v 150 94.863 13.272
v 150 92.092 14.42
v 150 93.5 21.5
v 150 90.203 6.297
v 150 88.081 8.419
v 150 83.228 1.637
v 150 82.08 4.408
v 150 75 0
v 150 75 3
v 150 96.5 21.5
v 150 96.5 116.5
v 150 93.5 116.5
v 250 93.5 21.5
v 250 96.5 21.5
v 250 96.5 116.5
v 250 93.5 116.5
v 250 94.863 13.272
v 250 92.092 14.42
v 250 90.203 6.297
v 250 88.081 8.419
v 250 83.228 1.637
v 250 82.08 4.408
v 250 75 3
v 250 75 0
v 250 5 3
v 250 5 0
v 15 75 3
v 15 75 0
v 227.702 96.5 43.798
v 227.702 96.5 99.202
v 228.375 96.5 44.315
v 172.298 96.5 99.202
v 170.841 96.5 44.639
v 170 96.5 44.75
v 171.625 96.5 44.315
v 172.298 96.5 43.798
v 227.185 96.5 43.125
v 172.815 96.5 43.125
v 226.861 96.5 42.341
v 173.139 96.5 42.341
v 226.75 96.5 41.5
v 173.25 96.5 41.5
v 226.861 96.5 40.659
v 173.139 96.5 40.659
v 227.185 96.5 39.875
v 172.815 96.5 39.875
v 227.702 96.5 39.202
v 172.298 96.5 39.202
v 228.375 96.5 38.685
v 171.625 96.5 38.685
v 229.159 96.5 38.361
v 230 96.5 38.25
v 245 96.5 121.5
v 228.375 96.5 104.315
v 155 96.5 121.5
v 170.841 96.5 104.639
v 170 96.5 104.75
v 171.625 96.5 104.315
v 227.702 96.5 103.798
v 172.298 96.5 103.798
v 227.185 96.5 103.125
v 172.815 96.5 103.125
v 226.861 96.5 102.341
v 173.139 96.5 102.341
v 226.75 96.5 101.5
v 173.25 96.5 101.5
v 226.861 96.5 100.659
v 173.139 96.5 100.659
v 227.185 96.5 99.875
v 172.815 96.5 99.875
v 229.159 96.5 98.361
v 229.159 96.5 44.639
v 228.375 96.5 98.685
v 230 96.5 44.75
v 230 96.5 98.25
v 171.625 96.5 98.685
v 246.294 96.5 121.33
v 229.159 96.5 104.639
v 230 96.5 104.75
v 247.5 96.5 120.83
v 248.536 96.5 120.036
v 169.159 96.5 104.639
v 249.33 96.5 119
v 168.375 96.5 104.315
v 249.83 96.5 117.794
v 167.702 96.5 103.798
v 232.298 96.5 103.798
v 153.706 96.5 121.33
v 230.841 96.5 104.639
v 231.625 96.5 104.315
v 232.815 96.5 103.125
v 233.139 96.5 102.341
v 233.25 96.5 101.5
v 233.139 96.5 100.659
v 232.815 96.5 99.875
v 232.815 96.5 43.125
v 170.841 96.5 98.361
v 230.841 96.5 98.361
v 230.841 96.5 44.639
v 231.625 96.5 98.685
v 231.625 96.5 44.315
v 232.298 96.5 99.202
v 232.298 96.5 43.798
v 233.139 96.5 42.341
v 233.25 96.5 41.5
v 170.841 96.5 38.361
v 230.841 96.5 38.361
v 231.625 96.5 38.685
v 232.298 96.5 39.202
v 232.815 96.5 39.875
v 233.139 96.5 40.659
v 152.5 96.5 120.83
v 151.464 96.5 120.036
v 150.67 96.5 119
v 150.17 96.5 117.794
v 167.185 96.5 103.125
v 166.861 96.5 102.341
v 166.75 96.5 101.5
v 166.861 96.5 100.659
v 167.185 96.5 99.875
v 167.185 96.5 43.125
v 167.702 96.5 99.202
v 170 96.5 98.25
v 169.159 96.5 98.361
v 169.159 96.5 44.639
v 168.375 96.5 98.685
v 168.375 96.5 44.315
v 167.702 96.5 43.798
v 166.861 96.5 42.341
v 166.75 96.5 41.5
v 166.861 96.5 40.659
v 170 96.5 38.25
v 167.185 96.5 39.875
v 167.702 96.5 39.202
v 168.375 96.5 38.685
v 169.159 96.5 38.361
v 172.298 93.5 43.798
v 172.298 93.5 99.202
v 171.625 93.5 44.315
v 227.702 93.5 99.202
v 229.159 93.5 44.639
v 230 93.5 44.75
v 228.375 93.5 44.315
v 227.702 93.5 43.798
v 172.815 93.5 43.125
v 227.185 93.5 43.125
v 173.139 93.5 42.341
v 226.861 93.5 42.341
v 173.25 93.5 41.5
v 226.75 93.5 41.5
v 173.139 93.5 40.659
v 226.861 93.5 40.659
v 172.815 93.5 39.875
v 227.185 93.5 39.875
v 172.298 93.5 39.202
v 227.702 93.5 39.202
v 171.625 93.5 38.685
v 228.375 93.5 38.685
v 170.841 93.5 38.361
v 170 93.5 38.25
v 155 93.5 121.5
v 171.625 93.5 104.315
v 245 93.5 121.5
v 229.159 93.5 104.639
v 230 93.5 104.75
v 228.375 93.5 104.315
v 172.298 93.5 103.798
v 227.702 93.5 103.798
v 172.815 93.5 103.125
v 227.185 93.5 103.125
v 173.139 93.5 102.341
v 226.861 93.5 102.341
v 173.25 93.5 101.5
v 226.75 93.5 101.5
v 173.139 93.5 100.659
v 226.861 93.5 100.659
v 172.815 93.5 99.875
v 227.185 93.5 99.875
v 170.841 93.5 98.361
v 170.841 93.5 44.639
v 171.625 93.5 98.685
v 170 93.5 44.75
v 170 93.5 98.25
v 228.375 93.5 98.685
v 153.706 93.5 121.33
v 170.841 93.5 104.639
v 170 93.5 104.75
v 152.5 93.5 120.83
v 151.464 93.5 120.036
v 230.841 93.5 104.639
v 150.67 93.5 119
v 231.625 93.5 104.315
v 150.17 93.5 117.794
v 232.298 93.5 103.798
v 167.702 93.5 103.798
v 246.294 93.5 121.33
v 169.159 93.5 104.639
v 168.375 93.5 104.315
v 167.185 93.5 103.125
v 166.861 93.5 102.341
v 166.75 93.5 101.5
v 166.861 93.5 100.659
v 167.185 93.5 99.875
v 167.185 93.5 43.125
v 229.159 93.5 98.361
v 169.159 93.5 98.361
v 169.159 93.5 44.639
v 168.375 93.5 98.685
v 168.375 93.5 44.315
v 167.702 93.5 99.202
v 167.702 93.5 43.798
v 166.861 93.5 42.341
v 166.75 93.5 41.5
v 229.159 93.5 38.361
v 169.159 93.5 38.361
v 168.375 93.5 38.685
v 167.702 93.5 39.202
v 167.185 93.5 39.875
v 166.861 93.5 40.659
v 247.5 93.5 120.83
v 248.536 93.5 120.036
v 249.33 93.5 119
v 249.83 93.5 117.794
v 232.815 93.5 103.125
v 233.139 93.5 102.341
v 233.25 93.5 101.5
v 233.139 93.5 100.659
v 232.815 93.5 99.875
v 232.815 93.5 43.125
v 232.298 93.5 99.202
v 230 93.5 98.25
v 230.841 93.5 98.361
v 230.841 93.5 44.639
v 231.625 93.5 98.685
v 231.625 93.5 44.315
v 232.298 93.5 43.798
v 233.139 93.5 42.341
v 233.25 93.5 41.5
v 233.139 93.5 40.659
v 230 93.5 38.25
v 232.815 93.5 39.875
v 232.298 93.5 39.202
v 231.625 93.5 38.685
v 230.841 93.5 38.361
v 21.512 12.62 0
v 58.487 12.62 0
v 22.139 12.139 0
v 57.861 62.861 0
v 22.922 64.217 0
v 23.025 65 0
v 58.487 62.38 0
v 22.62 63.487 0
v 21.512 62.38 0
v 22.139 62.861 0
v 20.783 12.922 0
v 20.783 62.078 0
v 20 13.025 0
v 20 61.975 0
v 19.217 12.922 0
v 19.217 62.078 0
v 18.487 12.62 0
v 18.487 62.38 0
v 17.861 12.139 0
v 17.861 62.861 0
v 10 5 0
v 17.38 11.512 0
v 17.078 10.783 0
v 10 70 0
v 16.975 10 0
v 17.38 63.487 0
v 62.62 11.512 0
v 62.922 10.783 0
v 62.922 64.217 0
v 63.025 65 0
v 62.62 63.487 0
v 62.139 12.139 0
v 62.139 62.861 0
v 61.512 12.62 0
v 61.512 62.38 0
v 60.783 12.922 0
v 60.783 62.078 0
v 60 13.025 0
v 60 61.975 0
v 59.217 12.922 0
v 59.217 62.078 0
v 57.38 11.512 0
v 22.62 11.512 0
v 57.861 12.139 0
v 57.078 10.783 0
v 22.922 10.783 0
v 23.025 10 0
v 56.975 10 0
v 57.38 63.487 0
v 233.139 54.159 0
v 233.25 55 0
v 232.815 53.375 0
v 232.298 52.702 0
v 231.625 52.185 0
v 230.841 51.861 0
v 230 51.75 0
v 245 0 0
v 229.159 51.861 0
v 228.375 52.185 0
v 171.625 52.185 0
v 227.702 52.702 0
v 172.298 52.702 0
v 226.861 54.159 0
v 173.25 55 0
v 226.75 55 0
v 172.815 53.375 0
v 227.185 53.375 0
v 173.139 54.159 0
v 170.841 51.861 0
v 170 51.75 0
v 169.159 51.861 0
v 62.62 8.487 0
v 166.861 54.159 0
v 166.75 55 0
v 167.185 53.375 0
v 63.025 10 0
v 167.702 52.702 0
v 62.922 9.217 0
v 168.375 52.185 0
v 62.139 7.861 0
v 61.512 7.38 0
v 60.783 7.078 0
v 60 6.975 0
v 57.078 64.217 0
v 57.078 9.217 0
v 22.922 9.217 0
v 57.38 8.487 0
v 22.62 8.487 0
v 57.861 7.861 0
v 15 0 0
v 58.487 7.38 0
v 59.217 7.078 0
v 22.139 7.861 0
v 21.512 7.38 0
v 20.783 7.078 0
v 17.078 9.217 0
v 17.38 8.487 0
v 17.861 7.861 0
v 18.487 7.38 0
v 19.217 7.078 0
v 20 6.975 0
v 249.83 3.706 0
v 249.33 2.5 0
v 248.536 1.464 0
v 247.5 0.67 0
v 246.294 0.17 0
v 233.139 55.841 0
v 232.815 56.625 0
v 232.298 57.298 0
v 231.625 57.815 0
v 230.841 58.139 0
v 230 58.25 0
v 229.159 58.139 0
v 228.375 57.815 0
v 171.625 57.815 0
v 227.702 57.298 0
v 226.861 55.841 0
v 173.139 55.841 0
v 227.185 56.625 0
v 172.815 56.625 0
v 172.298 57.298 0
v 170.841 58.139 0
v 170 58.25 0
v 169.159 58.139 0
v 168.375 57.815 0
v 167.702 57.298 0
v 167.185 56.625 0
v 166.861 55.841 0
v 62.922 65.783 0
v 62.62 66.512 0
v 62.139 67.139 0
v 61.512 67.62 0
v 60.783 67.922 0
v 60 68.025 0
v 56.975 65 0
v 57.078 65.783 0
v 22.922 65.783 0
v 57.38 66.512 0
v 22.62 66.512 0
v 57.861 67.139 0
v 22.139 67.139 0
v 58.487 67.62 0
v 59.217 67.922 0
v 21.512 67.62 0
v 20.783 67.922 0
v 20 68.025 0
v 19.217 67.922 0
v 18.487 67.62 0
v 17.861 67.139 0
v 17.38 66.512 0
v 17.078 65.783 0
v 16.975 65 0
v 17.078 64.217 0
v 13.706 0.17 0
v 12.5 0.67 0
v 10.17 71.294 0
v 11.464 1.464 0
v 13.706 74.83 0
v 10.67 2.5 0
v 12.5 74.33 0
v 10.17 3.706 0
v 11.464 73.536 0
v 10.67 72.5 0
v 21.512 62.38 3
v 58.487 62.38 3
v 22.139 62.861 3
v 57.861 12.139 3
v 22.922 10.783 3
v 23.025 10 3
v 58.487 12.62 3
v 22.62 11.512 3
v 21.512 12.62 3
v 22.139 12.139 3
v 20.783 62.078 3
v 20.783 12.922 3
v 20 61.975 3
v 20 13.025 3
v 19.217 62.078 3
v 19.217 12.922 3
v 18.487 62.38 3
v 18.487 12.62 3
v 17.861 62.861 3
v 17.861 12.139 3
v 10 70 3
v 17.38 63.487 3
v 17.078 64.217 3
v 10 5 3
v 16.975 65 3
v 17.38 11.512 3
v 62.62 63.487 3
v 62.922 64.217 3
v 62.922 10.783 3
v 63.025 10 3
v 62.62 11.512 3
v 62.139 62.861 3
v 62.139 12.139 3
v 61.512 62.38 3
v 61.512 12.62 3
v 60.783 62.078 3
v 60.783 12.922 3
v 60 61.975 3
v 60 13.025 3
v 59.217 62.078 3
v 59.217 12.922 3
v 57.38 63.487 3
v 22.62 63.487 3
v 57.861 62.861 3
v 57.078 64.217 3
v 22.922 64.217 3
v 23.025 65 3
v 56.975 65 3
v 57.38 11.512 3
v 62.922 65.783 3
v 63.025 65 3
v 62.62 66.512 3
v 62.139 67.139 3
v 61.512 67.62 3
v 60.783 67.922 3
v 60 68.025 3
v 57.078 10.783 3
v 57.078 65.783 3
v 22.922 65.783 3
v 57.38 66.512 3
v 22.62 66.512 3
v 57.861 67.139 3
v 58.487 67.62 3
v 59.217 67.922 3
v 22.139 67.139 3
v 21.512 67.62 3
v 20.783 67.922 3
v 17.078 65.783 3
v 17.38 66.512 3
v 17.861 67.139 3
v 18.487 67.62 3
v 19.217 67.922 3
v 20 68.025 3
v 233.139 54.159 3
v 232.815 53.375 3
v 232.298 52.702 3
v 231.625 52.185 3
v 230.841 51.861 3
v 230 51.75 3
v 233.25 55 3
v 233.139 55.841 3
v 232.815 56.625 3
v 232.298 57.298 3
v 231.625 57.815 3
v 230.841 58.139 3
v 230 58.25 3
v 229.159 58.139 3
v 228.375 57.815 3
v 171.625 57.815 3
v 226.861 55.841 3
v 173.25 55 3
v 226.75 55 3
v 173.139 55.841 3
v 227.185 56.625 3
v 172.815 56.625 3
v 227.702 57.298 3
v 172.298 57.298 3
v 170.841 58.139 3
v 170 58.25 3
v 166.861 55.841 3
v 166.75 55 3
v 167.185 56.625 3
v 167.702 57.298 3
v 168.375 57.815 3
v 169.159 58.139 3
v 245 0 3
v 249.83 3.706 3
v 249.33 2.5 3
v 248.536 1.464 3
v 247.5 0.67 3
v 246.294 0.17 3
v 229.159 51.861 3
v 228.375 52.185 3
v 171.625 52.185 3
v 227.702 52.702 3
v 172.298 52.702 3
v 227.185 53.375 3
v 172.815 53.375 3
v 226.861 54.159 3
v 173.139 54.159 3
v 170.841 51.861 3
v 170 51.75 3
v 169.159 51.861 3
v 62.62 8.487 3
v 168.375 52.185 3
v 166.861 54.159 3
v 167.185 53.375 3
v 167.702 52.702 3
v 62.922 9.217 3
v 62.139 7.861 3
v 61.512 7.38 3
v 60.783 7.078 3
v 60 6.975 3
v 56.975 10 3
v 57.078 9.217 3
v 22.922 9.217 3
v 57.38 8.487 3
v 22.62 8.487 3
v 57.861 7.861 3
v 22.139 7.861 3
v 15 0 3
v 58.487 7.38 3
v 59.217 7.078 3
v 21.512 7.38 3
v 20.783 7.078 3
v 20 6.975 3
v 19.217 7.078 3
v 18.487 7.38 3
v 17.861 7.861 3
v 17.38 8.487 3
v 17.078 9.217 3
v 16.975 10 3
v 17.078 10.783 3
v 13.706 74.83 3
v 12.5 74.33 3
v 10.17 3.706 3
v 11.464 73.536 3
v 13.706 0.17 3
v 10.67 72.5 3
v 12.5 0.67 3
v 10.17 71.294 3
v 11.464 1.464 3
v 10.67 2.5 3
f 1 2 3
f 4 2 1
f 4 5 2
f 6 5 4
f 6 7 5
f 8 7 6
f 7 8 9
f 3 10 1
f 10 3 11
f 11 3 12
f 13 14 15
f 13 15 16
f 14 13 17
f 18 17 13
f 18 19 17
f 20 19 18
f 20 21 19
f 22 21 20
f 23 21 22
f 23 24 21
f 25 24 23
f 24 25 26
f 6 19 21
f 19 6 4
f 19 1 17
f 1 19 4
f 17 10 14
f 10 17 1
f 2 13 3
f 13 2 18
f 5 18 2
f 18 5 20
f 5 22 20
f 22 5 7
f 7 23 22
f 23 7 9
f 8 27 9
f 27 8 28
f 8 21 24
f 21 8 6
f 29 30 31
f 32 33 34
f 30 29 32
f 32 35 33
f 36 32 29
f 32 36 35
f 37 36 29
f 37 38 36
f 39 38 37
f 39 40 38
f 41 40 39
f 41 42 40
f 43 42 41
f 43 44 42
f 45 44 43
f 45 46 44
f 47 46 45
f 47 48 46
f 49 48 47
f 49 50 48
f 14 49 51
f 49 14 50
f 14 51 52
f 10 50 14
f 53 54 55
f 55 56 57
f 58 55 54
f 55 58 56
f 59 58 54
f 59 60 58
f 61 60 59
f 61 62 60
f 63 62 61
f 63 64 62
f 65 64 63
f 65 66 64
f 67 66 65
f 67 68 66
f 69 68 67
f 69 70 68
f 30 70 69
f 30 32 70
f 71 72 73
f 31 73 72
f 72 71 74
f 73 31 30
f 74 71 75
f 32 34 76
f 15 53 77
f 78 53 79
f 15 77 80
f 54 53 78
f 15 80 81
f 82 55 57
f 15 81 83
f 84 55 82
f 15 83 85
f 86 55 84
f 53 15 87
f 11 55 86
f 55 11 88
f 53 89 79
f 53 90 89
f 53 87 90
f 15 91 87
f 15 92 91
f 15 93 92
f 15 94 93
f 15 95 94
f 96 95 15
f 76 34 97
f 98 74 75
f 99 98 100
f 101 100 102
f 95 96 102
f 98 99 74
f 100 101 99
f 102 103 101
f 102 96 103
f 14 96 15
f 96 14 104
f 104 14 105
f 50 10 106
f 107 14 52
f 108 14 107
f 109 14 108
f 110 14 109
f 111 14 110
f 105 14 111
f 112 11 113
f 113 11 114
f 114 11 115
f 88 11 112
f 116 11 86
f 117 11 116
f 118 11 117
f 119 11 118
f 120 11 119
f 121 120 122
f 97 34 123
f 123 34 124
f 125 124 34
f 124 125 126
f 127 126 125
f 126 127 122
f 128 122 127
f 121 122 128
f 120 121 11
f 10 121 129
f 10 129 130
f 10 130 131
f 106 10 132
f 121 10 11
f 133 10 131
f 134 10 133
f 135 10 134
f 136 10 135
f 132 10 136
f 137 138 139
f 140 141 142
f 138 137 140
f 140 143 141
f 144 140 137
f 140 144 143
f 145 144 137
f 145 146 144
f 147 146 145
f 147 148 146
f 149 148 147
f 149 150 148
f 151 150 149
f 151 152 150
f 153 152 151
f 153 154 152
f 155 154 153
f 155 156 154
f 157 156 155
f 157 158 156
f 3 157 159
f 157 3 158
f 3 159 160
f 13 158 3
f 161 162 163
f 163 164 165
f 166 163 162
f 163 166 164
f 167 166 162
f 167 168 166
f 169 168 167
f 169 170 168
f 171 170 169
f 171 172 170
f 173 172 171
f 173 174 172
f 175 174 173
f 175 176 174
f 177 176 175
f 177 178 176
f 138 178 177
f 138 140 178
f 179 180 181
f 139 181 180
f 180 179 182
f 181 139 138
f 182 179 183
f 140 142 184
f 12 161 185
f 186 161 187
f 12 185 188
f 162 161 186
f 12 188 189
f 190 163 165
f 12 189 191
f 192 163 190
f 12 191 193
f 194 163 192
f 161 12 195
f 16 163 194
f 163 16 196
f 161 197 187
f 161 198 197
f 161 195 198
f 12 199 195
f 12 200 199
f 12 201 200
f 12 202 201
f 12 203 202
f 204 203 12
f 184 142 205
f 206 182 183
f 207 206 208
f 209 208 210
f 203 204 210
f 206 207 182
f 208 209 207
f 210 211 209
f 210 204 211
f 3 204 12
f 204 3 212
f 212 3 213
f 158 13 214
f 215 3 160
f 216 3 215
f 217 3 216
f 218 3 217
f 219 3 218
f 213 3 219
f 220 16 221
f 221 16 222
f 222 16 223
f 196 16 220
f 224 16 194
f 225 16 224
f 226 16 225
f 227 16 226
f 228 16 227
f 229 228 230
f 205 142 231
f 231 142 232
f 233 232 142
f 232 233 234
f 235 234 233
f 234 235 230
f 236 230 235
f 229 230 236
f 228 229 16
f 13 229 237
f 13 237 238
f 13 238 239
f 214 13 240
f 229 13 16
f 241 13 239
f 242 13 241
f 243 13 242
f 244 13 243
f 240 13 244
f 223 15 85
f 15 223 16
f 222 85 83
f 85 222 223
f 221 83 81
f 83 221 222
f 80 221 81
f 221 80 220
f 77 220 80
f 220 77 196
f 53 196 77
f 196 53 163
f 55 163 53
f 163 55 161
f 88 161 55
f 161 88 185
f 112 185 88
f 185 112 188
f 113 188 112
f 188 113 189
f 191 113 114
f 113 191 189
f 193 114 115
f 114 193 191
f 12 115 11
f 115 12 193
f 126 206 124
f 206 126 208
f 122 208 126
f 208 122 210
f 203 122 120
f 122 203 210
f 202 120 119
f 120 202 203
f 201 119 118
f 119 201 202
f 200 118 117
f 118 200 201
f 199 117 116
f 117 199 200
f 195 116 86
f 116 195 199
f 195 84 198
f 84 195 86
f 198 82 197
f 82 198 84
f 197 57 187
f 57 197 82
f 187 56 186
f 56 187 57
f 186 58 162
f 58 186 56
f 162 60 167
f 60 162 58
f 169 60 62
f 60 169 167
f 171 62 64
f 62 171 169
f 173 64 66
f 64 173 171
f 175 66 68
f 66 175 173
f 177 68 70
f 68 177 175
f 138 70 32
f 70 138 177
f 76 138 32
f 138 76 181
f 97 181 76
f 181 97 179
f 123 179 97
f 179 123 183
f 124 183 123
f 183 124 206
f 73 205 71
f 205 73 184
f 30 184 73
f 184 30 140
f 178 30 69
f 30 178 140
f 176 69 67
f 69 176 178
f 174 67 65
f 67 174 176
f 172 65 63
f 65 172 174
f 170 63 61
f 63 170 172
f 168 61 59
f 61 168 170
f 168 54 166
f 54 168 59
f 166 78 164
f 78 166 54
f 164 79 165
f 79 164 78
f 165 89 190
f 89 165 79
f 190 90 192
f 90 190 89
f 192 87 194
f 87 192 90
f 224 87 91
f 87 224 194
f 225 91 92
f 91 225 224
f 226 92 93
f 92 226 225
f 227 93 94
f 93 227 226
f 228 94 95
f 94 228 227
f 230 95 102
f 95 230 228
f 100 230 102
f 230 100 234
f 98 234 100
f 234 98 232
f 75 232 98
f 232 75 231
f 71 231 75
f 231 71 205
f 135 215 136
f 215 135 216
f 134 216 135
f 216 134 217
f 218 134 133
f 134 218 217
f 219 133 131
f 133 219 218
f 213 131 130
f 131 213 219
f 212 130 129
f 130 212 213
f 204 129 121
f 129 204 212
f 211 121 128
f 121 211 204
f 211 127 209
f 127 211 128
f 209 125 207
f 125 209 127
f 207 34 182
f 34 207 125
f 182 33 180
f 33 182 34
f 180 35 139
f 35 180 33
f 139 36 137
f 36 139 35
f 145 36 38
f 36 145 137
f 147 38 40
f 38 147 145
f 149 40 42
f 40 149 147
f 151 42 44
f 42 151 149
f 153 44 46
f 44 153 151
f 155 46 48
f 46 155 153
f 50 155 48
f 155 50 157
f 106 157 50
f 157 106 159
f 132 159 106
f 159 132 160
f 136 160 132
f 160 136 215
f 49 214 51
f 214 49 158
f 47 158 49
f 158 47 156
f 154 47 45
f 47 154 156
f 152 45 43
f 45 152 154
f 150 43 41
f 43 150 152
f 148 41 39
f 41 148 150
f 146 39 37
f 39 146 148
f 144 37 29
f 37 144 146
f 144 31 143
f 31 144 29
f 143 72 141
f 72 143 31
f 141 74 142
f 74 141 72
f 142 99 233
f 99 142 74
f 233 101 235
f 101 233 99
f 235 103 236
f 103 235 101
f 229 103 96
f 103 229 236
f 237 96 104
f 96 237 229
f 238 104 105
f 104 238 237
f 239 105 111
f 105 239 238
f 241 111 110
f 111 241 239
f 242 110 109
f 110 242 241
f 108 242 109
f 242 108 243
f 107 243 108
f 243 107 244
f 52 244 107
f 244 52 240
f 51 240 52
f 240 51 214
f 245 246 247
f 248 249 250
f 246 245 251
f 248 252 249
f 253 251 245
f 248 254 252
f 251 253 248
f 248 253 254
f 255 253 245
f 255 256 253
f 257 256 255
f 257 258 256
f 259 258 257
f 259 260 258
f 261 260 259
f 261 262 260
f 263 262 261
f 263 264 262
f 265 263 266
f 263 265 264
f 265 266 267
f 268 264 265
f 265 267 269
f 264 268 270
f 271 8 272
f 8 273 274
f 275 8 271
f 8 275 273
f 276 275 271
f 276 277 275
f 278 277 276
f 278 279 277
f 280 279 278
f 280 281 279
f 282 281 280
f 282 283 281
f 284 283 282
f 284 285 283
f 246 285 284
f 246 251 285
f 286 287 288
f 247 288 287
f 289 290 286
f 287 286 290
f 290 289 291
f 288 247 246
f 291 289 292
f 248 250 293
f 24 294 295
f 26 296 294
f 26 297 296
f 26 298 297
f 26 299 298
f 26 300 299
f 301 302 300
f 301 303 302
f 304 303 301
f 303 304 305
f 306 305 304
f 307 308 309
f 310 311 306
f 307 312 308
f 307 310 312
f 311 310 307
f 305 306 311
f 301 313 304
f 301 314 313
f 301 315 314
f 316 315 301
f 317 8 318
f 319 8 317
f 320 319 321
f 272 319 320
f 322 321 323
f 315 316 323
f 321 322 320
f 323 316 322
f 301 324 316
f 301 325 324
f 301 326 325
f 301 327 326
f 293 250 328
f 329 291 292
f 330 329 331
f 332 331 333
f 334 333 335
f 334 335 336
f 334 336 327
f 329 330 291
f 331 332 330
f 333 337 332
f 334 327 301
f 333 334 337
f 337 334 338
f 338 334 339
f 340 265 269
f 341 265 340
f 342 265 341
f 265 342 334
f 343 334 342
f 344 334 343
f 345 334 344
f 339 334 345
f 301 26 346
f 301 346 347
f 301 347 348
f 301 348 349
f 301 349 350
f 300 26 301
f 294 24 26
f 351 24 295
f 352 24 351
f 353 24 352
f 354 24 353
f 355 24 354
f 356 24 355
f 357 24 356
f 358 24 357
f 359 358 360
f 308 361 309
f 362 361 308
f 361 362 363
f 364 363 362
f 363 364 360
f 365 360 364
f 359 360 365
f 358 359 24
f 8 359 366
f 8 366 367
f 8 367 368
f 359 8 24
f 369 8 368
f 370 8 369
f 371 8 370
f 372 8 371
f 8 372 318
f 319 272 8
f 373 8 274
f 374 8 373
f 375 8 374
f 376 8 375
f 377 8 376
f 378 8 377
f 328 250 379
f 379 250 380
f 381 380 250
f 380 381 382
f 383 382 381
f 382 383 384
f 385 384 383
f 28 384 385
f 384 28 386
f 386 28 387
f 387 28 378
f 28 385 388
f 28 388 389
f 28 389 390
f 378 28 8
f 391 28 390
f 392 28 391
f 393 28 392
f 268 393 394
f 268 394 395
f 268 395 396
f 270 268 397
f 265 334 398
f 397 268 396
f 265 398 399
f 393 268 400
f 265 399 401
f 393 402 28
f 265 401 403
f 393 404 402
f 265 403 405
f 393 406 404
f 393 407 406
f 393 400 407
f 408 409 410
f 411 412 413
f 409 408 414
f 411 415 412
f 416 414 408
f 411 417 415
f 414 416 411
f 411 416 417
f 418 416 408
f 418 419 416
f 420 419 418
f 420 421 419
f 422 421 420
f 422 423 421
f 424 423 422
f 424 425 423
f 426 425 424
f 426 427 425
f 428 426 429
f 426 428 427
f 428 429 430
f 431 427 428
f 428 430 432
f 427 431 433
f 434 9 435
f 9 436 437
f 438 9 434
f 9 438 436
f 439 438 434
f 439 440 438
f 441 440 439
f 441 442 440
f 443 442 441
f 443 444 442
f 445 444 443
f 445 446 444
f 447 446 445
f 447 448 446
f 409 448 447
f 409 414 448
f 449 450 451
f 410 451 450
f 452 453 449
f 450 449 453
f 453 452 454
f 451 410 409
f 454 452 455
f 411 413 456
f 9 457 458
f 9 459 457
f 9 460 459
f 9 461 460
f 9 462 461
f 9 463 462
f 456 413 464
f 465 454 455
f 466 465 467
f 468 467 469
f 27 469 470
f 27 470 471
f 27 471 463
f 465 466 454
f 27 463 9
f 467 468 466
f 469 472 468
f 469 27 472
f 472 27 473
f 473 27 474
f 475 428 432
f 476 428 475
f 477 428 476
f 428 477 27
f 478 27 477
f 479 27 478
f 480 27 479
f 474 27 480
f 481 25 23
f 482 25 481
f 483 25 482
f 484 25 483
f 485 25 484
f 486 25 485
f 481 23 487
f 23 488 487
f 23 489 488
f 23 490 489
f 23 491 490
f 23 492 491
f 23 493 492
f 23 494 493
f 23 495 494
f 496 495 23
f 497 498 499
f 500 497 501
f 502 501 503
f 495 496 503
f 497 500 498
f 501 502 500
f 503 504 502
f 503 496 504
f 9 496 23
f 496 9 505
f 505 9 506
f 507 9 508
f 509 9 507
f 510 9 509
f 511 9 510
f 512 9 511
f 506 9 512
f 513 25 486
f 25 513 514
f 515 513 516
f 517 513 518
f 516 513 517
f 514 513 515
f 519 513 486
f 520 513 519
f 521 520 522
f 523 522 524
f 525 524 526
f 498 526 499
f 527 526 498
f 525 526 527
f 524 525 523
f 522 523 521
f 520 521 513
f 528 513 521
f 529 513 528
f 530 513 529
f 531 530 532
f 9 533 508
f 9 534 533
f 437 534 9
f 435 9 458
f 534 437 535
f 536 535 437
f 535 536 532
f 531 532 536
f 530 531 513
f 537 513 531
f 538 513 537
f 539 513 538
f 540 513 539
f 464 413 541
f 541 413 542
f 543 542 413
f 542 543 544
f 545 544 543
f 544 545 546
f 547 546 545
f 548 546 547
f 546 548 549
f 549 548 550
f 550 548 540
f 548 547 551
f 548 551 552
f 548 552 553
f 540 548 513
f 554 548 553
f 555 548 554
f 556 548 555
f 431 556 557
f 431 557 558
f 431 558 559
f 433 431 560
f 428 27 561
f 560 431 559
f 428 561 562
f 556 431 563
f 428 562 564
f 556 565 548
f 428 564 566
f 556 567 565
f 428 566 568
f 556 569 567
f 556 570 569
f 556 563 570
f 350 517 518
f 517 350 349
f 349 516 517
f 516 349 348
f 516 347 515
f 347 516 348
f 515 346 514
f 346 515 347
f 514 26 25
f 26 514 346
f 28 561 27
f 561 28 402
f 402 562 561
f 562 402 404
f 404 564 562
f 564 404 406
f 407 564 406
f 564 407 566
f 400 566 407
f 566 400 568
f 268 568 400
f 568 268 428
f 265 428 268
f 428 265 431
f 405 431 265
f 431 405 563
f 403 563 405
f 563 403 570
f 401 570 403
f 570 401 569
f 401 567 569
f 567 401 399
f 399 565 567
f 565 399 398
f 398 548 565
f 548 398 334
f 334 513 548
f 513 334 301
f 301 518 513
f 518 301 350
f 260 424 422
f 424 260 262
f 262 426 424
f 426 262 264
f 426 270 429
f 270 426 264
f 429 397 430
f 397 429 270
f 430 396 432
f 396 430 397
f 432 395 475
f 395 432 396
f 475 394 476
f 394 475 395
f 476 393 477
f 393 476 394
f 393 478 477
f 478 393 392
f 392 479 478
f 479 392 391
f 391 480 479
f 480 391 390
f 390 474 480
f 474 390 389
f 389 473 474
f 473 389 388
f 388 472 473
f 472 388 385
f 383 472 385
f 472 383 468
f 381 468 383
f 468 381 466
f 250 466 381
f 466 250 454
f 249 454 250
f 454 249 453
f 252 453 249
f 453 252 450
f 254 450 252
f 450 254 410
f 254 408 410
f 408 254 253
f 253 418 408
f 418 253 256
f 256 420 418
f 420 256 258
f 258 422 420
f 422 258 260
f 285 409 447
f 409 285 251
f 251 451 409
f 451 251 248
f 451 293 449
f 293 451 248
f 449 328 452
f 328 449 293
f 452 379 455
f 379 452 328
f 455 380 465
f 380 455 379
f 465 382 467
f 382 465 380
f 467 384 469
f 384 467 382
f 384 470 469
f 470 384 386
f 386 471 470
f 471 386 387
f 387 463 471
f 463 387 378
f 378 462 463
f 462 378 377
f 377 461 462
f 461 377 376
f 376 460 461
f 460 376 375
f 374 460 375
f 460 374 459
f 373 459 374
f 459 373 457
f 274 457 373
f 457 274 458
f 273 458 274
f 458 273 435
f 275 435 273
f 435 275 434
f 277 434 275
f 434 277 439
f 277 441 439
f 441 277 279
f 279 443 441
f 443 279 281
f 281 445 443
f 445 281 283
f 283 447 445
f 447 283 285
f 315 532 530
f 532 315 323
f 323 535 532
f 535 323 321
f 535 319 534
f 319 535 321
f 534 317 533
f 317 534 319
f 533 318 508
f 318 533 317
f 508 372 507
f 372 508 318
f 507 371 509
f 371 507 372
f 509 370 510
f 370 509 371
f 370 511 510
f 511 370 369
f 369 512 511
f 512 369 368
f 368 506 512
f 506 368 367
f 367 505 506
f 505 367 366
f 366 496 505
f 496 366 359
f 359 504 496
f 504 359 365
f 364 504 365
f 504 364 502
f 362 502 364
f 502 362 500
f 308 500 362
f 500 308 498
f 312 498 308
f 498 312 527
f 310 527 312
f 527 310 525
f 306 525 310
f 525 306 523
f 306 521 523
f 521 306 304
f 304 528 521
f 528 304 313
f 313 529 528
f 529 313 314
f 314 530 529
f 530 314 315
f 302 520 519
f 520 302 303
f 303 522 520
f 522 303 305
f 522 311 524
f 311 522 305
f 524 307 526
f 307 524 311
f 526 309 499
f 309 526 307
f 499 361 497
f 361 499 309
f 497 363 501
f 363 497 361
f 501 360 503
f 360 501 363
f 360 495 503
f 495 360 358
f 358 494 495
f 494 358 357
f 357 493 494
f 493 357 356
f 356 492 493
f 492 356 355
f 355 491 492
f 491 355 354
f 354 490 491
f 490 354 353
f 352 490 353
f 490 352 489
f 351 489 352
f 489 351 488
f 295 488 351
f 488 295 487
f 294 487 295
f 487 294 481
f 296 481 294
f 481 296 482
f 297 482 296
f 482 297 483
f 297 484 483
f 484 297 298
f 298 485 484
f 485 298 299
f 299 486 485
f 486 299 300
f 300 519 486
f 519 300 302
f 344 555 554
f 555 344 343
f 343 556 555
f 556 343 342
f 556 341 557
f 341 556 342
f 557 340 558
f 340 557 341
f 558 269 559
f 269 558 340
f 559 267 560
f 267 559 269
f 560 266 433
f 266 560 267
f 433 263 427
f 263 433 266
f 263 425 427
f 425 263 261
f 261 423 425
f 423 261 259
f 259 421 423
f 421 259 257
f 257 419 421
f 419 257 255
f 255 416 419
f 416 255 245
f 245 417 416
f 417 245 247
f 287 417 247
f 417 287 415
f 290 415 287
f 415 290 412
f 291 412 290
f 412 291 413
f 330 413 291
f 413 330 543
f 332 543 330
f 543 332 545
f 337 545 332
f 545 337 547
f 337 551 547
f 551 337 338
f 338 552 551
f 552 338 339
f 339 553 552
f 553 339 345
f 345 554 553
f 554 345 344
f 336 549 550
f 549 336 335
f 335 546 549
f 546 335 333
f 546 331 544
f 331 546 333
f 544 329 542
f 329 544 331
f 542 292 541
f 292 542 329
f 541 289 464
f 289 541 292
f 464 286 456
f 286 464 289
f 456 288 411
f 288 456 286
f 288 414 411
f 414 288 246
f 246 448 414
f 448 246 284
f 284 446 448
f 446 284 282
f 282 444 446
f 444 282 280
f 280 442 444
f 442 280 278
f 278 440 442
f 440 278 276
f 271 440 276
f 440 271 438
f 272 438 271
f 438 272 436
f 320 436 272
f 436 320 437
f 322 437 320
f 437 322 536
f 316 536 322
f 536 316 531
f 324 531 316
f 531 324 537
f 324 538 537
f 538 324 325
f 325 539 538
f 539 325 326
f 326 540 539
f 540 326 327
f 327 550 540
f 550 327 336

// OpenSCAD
$fn=24;

tie_height=80;
thickness=3;
lie_flat=false;

tie_bolt_inner_from_center = 20;
tie_bolt_dia=6.05;
tie_bolt_space_x=40;
tie_bolt_space_y=55;

z1_bolt_space=60;
z1_bolt_dia=6.5;

inter_z1_spacing=400;

plate_margin=10;
plate_size_lower_x=tie_bolt_space_x+(plate_margin*2);
plate_size_y=tie_bolt_space_y+(plate_margin*2);

z1_mounting_margin=20;
rounding=5;

module stepped_bend(width=100,neutral_radius=20,steps=4){
	if(lie_flat){
		color("blue")square([width,neutral_radius*PI/2]);
		translate([0,neutral_radius*PI/2])children();
	} else {
		color("blue")translate([0,0,neutral_radius+thickness/2])rotate([0,90,0])linear_extrude(width)intersection(){
			difference(){
				circle(r=neutral_radius+thickness/2,$fn=steps*4);
				circle(r=neutral_radius-thickness/2,$fn=steps*4);
			}
			square(neutral_radius+thickness);
		}
		translate([0,neutral_radius+thickness/2,neutral_radius+thickness/2])rotate([90,0,0])children();
	}
}
module flat_section(){
	if(lie_flat){
		children();
	} else {
		linear_extrude(thickness)children();
	}
}

// TODO: this scad needs a bit of cleanup loooool
module arm_mount(){
	flat_section()translate([tie_bolt_inner_from_center-plate_margin,0])difference(){
		union(){
			offset(rounding)offset(-rounding)
			square([plate_margin+(inter_z1_spacing+z1_bolt_space)/2,plate_size_y]);
			translate([plate_margin+(inter_z1_spacing+z1_bolt_space)/2-rounding,plate_size_y-rounding])
				square(rounding);
		}
		
		for(x=[0:tie_bolt_space_x:tie_bolt_space_x])for(y=[0:tie_bolt_space_y:tie_bolt_space_y])
			translate([x+plate_margin,y+plate_margin])circle(d=tie_bolt_dia);

		for(x=[0:z1_bolt_space:z1_bolt_space])
		translate([x+(inter_z1_spacing-z1_bolt_space-z1_mounting_margin)/2,plate_size_y-z1_mounting_margin])
		
		circle(d=z1_bolt_dia);
	}

	translate([(inter_z1_spacing-z1_bolt_space)/2-z1_mounting_margin,plate_size_y])stepped_bend(){
		flat_section()difference(){
			union(){
				offset(rounding)offset(-rounding)square([100,z1_bolt_space+(z1_mounting_margin*2)]);
				square([100,50]);
			}
			for(x=[0:z1_bolt_space:z1_bolt_space]) for(y=[0:z1_bolt_space:z1_bolt_space])translate([x+z1_mounting_margin,y+z1_mounting_margin])circle(d=z1_bolt_dia);
		}
	}
}
arm_mount();
